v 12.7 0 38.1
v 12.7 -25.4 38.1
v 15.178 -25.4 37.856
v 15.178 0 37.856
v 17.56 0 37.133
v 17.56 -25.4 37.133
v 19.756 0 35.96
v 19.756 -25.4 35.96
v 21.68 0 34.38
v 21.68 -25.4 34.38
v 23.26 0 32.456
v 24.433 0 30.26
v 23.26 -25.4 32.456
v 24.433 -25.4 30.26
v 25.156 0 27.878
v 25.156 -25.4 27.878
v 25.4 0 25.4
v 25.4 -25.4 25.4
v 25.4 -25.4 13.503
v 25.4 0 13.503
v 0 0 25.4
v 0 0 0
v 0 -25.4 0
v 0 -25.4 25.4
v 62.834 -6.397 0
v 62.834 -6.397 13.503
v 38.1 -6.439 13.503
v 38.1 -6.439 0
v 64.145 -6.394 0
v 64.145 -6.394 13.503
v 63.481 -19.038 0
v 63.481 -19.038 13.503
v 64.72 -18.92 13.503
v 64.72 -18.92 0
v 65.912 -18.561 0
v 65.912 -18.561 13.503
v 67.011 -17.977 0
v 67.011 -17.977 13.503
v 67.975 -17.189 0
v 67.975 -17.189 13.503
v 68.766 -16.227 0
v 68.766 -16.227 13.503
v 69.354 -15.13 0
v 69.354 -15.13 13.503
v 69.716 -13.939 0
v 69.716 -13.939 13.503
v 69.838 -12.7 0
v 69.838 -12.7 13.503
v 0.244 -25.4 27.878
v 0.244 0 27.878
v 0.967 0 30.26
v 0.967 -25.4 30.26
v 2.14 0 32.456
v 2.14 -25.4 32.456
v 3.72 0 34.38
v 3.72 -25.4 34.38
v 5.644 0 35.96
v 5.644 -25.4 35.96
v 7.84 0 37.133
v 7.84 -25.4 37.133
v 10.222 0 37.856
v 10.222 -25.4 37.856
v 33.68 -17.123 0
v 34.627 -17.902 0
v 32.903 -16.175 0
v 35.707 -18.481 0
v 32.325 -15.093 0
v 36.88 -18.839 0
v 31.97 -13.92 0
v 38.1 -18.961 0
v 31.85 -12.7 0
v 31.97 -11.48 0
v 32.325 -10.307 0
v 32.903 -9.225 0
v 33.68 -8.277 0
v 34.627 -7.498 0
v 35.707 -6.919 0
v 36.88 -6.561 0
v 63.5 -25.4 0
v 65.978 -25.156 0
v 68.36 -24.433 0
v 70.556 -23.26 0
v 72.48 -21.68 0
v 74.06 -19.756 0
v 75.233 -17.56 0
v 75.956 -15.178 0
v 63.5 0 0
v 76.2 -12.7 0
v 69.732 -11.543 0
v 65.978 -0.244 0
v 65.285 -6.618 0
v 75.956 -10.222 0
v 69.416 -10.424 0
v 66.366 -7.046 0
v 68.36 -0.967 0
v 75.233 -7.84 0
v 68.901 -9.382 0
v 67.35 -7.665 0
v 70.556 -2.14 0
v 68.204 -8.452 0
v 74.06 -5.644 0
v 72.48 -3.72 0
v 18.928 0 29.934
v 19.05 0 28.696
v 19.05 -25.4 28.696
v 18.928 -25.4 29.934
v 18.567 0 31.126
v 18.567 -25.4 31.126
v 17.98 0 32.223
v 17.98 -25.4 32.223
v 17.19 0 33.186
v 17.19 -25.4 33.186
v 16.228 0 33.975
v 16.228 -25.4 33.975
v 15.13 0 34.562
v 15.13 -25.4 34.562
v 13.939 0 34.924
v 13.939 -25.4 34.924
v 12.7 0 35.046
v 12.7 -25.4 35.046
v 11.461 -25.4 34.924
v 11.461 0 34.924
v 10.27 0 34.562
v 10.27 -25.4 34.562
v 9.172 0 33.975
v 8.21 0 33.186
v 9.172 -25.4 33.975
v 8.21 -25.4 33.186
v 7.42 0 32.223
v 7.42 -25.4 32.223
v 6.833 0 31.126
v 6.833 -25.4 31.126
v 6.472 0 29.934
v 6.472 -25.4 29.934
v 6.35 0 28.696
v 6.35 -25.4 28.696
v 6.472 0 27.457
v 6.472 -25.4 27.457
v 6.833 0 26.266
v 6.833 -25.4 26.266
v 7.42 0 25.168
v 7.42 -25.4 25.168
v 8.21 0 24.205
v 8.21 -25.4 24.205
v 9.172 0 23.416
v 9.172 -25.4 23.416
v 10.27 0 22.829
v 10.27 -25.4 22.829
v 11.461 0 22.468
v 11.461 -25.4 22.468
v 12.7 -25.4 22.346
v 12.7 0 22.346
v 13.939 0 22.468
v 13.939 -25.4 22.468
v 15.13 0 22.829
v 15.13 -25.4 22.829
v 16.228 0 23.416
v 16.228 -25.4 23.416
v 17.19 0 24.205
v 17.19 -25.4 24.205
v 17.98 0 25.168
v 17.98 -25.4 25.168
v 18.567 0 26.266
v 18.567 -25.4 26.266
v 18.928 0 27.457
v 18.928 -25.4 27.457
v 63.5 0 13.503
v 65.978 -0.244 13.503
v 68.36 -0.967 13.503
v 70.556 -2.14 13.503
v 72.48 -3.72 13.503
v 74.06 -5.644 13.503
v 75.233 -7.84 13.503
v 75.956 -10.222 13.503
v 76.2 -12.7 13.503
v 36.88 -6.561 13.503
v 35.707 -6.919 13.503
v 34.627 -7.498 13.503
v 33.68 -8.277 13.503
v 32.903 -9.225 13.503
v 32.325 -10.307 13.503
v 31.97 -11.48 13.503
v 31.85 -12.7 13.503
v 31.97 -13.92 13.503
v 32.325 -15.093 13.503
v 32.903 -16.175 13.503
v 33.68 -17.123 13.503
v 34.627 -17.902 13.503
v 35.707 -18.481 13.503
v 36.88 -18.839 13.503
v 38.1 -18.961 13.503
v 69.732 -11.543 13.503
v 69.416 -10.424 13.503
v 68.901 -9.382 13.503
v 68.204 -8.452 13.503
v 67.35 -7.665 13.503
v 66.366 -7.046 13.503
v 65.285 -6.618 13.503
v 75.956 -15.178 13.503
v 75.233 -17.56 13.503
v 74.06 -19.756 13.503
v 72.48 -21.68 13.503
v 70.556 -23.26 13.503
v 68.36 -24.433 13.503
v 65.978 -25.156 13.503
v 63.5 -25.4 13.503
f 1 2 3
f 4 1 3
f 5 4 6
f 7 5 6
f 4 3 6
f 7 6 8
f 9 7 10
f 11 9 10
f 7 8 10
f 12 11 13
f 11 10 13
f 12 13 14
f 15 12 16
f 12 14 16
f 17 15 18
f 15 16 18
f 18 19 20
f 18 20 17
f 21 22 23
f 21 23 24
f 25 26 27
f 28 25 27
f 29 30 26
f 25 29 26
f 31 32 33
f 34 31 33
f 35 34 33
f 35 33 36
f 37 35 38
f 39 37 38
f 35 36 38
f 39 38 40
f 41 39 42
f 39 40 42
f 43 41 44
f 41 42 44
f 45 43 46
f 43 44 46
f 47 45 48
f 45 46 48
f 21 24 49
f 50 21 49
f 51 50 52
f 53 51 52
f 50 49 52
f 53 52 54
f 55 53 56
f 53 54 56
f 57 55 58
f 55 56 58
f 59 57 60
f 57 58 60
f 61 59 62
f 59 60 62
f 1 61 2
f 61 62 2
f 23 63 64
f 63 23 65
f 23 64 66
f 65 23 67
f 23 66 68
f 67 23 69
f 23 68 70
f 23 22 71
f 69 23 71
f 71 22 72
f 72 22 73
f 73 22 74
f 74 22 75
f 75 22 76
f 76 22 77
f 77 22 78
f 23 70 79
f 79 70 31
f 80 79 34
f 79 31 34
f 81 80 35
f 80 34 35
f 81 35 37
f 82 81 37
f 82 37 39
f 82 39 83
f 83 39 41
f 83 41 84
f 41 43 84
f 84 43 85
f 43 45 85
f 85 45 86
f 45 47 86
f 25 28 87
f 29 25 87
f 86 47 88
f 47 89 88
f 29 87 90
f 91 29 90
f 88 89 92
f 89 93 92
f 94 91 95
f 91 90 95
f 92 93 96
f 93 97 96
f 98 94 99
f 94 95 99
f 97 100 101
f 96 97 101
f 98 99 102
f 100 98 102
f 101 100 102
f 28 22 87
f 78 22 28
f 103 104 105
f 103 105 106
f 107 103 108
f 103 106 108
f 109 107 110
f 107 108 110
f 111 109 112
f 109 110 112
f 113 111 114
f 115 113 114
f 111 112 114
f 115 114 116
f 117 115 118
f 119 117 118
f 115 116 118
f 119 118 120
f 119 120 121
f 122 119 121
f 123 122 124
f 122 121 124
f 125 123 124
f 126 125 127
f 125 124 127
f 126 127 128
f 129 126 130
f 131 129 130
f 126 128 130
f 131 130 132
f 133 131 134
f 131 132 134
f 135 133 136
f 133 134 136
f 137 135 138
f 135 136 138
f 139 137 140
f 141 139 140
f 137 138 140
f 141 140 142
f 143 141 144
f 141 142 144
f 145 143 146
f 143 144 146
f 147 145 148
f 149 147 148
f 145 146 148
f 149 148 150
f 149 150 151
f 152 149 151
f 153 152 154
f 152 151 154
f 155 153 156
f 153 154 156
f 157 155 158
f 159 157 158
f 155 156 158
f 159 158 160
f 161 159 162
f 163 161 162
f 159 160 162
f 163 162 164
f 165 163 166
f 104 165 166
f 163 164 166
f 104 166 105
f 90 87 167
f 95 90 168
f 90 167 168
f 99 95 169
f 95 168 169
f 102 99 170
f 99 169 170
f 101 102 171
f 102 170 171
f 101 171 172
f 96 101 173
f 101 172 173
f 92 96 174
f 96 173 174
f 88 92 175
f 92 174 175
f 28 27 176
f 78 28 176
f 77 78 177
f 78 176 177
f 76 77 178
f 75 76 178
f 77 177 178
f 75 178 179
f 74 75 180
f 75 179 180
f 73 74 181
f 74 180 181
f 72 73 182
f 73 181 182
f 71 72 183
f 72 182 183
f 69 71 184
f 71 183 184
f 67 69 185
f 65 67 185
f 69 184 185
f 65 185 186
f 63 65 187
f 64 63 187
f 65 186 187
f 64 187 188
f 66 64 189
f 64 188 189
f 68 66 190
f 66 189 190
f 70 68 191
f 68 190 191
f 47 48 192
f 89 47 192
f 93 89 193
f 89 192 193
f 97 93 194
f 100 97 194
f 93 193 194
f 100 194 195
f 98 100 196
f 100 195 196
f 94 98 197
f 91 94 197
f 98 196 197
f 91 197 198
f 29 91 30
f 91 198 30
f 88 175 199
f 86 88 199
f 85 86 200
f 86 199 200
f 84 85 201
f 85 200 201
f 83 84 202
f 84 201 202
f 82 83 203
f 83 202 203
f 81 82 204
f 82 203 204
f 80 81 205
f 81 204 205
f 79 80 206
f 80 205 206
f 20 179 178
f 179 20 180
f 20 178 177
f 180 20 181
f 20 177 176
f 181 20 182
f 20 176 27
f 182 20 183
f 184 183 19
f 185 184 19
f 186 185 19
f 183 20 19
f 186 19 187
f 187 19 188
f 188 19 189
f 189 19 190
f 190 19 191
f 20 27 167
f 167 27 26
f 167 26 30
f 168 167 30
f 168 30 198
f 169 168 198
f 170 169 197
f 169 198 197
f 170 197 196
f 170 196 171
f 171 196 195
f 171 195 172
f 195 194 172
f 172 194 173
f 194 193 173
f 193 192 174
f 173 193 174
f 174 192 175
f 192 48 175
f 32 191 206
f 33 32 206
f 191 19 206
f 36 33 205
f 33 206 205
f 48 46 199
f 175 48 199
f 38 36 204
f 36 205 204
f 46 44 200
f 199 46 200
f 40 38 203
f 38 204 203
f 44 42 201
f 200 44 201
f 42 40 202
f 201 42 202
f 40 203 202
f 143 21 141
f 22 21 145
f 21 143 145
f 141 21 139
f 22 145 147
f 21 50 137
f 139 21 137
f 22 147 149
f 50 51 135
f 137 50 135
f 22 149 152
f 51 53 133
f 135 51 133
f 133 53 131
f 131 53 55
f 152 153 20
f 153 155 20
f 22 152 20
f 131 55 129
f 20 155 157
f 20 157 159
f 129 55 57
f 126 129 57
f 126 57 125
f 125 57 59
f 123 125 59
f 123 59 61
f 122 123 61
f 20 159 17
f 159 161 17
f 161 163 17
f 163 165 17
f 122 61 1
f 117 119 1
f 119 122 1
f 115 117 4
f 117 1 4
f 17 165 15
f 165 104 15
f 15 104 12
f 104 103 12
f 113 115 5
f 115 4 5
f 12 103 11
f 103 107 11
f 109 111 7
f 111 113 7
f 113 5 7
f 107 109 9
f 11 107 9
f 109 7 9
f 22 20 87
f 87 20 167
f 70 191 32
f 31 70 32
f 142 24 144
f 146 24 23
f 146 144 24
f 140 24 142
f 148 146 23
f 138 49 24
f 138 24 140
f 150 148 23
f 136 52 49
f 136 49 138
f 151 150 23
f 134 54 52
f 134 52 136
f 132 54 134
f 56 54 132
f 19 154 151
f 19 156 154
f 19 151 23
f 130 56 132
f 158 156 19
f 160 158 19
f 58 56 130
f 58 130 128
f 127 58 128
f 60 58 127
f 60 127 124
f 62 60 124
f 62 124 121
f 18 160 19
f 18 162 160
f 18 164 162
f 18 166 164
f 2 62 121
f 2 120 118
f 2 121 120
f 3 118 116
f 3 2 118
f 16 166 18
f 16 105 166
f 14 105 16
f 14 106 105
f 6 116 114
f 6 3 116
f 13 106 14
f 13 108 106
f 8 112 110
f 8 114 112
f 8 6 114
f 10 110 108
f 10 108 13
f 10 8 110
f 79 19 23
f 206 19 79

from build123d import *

# Parameters (mm, degrees)
F0_W      = 76.2
F0_H      = 38.1
F1_DEPTH  = 25.4
F2_W      = 50.8
F2_H      = 24.5972746
F3_DEPTH  = 25.4
F4_R      = 6.35
F5_DEPTH  = 25.4
F7_DEPTH  = 25.4
F9_DEPTH  = 25.4
F11_DEPTH = 25.4


with BuildPart() as f1:
    # F0 (on Front) → F1 (new body)
    with BuildSketch(Plane.XZ):
        with Locations((38.1, 19.05)):
            Rectangle(F0_W, F0_H)
    extrude(amount=F1_DEPTH)

    # F2 (on face) → F3 (cut)
    with BuildSketch(Plane.XZ.offset(25.4)):
        with Locations((50.8, 25.8013627)):
            Rectangle(F2_W, F2_H)
    extrude(amount=-F3_DEPTH, mode=Mode.SUBTRACT)

    # F4 (on face) → F5 (cut)
    with BuildSketch(Plane.XZ.offset(25.4)):
        with Locations((12.7, 28.6956075579)):
            Circle(F4_R)
    extrude(amount=-F5_DEPTH, mode=Mode.SUBTRACT)

    # F6 (on face) → F7 (cut)
    with BuildSketch(Plane.XZ.offset(25.4)):
        with BuildLine():
            ThreePointArc((0, 25.4), (3.7197438789, 34.3802561211), (12.7, 38.1))
            Line((12.7, 38.1), (0, 38.1))
            Line((0, 38.1), (0, 25.4))
        make_face()
        with BuildLine():
            ThreePointArc((12.7, 38.1), (21.6802561211, 34.3802561211), (25.4, 25.4))
            Line((25.4, 25.4), (25.4, 38.1))
            Line((25.4, 38.1), (12.7, 38.1))
        make_face()
    extrude(amount=-F7_DEPTH, mode=Mode.SUBTRACT)

    # F8 (on face) → F9 (cut)
    with BuildSketch(Plane.XY.offset(13.5027254)):
        with BuildLine():
            ThreePointArc((63.5, 0), (72.4802561211, -3.7197438789), (76.2, -12.7))
            Line((76.2, -12.7), (76.2, 0))
            Line((76.2, 0), (63.5, 0))
        make_face()
        with BuildLine():
            ThreePointArc((76.2, -12.7), (72.4802561211, -21.6802561211), (63.5, -25.4))
            Line((63.5, -25.4), (76.2, -25.4))
            Line((76.2, -25.4), (76.2, -12.7))
        make_face()
    extrude(amount=-F9_DEPTH, mode=Mode.SUBTRACT)

    # F10 (on face) → F11 (cut)
    with BuildSketch(Plane.XY.offset(13.5027254)):
        with BuildLine():
            ThreePointArc((63.480662017, -19.0383808314), (67.9750906946, -17.1887647294), (69.8384103307, -12.7))
            ThreePointArc((69.8384103307, -12.7), (68.2043841634, -8.4521517018), (64.1448012955, -6.3944725193))
            Line((64.1448012955, -6.3944725193), (62.8336159646, -6.3967169))
            ThreePointArc((62.8336159646, -6.3967169), (57.1698759562, -13.0239986283), (63.480662017, -19.0383808314))
        make_face()
        with BuildLine():
            Line((38.1, -18.9609461011), (63.480662017, -19.0383808314))
            ThreePointArc((63.480662017, -19.0383808314), (57.1698759562, -13.0239986283), (62.8336159646, -6.3967169))
            Line((62.8336159646, -6.3967169), (38.1, -6.4390538989))
            ThreePointArc((38.1, -6.4390538989), (42.534090263, -8.269048665), (44.3716722533, -12.7))
            ThreePointArc((44.3716722533, -12.7), (42.534090263, -17.130951335), (38.1, -18.9609461011))
        make_face()
        with BuildLine():
            ThreePointArc((38.1, -6.4390538989), (31.8497617067, -12.7), (38.1, -18.9609461011))
            ThreePointArc((38.1, -18.9609461011), (42.534090263, -17.130951335), (44.3716722533, -12.7))
            ThreePointArc((44.3716722533, -12.7), (42.534090263, -8.269048665), (38.1, -6.4390538989))
        make_face()
    extrude(amount=-F11_DEPTH, mode=Mode.SUBTRACT)


solid = f1.part
